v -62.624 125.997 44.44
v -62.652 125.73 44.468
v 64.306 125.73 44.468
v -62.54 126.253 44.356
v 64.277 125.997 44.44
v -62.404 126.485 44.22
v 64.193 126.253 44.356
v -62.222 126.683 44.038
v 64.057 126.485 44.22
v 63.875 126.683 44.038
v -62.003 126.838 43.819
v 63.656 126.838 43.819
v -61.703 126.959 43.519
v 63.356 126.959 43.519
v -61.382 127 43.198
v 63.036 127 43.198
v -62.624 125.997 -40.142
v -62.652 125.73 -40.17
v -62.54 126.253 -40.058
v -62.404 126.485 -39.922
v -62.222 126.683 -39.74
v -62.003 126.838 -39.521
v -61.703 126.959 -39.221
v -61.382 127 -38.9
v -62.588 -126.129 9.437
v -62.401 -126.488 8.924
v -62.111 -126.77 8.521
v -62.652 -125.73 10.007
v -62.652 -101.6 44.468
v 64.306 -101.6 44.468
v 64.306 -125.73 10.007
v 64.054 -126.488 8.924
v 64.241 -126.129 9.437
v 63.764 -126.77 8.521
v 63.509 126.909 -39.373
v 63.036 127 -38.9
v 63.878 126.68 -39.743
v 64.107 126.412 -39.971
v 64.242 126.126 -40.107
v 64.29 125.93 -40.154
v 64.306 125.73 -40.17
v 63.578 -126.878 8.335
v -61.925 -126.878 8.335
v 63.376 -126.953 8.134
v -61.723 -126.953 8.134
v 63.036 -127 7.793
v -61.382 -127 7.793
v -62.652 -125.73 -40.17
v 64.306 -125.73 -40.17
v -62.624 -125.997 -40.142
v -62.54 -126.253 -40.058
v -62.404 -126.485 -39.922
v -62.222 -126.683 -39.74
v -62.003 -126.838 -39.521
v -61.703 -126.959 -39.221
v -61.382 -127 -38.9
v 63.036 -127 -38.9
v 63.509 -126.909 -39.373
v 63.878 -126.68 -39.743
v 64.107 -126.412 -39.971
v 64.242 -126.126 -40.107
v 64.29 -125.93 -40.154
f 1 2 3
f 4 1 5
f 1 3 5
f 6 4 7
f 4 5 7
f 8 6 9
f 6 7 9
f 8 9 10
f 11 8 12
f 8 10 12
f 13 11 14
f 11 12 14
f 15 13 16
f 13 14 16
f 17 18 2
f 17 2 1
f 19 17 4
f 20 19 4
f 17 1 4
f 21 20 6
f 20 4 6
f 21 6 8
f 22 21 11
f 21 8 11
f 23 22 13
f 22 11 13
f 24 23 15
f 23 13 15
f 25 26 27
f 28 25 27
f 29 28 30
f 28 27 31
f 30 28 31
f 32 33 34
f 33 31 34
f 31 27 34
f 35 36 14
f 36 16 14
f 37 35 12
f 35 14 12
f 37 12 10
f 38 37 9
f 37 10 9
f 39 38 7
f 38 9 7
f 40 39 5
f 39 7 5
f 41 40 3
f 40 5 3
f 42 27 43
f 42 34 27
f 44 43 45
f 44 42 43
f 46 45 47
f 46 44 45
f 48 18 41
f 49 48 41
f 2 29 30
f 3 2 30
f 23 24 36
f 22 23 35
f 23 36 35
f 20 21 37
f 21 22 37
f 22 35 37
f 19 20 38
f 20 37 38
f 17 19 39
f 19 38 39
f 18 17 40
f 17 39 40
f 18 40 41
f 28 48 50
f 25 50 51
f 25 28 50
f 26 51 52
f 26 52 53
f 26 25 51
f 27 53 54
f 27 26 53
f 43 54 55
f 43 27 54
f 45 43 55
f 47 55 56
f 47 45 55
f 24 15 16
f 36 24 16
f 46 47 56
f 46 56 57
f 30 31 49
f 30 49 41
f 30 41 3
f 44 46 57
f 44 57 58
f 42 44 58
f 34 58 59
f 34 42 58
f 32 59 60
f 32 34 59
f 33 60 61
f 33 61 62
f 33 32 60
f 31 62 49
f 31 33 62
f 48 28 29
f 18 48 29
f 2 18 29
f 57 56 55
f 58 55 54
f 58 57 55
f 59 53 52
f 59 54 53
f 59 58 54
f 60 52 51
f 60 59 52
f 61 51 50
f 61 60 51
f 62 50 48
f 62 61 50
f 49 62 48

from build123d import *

# Parameters (mm, degrees)
F0_W     = 126.9580200315
F0_H     = 84.6386812627
F1_DEPTH = 127
F2_SIZE2 = 36.2749593712
F2_SIZE  = 25.4
F3_R     = 1.27


with BuildPart() as f1:
    # F0 (on Front) → F1 (new body, symmetric)
    with BuildSketch(Plane.XZ):
        with Locations((0.826548785, 2.1490287036)):
            Rectangle(F0_W, F0_H)
    extrude(amount=F1_DEPTH, both=True)

    # F2
    f2_edges = [f1.edges().sort_by_distance(p)[0] for p in [
        (0.826549, -127, 44.468369),
    ]]
    f2_side = f1.faces().sort_by_distance((0.826549, 0, 44.468369))[0]
    chamfer(f2_edges, length=F2_SIZE, length2=F2_SIZE2, reference=f2_side)

    # F3
    f3_edges = [f1.edges().sort_by_distance(p)[0] for p in [
        (0.826549, 127, 44.468369),
        (-62.652461, 127, 2.149029),
        (0.826549, 127, -40.170312),
        (64.305559, 127, 2.149029),
        (-62.652461, -127, -15.988451),
        (0.826549, -127, 8.19341),
        (0.826549, -127, -40.170312),
        (64.305559, -127, -15.988451),
    ]]
    fillet(f3_edges, radius=F3_R)


solid = f1.part
